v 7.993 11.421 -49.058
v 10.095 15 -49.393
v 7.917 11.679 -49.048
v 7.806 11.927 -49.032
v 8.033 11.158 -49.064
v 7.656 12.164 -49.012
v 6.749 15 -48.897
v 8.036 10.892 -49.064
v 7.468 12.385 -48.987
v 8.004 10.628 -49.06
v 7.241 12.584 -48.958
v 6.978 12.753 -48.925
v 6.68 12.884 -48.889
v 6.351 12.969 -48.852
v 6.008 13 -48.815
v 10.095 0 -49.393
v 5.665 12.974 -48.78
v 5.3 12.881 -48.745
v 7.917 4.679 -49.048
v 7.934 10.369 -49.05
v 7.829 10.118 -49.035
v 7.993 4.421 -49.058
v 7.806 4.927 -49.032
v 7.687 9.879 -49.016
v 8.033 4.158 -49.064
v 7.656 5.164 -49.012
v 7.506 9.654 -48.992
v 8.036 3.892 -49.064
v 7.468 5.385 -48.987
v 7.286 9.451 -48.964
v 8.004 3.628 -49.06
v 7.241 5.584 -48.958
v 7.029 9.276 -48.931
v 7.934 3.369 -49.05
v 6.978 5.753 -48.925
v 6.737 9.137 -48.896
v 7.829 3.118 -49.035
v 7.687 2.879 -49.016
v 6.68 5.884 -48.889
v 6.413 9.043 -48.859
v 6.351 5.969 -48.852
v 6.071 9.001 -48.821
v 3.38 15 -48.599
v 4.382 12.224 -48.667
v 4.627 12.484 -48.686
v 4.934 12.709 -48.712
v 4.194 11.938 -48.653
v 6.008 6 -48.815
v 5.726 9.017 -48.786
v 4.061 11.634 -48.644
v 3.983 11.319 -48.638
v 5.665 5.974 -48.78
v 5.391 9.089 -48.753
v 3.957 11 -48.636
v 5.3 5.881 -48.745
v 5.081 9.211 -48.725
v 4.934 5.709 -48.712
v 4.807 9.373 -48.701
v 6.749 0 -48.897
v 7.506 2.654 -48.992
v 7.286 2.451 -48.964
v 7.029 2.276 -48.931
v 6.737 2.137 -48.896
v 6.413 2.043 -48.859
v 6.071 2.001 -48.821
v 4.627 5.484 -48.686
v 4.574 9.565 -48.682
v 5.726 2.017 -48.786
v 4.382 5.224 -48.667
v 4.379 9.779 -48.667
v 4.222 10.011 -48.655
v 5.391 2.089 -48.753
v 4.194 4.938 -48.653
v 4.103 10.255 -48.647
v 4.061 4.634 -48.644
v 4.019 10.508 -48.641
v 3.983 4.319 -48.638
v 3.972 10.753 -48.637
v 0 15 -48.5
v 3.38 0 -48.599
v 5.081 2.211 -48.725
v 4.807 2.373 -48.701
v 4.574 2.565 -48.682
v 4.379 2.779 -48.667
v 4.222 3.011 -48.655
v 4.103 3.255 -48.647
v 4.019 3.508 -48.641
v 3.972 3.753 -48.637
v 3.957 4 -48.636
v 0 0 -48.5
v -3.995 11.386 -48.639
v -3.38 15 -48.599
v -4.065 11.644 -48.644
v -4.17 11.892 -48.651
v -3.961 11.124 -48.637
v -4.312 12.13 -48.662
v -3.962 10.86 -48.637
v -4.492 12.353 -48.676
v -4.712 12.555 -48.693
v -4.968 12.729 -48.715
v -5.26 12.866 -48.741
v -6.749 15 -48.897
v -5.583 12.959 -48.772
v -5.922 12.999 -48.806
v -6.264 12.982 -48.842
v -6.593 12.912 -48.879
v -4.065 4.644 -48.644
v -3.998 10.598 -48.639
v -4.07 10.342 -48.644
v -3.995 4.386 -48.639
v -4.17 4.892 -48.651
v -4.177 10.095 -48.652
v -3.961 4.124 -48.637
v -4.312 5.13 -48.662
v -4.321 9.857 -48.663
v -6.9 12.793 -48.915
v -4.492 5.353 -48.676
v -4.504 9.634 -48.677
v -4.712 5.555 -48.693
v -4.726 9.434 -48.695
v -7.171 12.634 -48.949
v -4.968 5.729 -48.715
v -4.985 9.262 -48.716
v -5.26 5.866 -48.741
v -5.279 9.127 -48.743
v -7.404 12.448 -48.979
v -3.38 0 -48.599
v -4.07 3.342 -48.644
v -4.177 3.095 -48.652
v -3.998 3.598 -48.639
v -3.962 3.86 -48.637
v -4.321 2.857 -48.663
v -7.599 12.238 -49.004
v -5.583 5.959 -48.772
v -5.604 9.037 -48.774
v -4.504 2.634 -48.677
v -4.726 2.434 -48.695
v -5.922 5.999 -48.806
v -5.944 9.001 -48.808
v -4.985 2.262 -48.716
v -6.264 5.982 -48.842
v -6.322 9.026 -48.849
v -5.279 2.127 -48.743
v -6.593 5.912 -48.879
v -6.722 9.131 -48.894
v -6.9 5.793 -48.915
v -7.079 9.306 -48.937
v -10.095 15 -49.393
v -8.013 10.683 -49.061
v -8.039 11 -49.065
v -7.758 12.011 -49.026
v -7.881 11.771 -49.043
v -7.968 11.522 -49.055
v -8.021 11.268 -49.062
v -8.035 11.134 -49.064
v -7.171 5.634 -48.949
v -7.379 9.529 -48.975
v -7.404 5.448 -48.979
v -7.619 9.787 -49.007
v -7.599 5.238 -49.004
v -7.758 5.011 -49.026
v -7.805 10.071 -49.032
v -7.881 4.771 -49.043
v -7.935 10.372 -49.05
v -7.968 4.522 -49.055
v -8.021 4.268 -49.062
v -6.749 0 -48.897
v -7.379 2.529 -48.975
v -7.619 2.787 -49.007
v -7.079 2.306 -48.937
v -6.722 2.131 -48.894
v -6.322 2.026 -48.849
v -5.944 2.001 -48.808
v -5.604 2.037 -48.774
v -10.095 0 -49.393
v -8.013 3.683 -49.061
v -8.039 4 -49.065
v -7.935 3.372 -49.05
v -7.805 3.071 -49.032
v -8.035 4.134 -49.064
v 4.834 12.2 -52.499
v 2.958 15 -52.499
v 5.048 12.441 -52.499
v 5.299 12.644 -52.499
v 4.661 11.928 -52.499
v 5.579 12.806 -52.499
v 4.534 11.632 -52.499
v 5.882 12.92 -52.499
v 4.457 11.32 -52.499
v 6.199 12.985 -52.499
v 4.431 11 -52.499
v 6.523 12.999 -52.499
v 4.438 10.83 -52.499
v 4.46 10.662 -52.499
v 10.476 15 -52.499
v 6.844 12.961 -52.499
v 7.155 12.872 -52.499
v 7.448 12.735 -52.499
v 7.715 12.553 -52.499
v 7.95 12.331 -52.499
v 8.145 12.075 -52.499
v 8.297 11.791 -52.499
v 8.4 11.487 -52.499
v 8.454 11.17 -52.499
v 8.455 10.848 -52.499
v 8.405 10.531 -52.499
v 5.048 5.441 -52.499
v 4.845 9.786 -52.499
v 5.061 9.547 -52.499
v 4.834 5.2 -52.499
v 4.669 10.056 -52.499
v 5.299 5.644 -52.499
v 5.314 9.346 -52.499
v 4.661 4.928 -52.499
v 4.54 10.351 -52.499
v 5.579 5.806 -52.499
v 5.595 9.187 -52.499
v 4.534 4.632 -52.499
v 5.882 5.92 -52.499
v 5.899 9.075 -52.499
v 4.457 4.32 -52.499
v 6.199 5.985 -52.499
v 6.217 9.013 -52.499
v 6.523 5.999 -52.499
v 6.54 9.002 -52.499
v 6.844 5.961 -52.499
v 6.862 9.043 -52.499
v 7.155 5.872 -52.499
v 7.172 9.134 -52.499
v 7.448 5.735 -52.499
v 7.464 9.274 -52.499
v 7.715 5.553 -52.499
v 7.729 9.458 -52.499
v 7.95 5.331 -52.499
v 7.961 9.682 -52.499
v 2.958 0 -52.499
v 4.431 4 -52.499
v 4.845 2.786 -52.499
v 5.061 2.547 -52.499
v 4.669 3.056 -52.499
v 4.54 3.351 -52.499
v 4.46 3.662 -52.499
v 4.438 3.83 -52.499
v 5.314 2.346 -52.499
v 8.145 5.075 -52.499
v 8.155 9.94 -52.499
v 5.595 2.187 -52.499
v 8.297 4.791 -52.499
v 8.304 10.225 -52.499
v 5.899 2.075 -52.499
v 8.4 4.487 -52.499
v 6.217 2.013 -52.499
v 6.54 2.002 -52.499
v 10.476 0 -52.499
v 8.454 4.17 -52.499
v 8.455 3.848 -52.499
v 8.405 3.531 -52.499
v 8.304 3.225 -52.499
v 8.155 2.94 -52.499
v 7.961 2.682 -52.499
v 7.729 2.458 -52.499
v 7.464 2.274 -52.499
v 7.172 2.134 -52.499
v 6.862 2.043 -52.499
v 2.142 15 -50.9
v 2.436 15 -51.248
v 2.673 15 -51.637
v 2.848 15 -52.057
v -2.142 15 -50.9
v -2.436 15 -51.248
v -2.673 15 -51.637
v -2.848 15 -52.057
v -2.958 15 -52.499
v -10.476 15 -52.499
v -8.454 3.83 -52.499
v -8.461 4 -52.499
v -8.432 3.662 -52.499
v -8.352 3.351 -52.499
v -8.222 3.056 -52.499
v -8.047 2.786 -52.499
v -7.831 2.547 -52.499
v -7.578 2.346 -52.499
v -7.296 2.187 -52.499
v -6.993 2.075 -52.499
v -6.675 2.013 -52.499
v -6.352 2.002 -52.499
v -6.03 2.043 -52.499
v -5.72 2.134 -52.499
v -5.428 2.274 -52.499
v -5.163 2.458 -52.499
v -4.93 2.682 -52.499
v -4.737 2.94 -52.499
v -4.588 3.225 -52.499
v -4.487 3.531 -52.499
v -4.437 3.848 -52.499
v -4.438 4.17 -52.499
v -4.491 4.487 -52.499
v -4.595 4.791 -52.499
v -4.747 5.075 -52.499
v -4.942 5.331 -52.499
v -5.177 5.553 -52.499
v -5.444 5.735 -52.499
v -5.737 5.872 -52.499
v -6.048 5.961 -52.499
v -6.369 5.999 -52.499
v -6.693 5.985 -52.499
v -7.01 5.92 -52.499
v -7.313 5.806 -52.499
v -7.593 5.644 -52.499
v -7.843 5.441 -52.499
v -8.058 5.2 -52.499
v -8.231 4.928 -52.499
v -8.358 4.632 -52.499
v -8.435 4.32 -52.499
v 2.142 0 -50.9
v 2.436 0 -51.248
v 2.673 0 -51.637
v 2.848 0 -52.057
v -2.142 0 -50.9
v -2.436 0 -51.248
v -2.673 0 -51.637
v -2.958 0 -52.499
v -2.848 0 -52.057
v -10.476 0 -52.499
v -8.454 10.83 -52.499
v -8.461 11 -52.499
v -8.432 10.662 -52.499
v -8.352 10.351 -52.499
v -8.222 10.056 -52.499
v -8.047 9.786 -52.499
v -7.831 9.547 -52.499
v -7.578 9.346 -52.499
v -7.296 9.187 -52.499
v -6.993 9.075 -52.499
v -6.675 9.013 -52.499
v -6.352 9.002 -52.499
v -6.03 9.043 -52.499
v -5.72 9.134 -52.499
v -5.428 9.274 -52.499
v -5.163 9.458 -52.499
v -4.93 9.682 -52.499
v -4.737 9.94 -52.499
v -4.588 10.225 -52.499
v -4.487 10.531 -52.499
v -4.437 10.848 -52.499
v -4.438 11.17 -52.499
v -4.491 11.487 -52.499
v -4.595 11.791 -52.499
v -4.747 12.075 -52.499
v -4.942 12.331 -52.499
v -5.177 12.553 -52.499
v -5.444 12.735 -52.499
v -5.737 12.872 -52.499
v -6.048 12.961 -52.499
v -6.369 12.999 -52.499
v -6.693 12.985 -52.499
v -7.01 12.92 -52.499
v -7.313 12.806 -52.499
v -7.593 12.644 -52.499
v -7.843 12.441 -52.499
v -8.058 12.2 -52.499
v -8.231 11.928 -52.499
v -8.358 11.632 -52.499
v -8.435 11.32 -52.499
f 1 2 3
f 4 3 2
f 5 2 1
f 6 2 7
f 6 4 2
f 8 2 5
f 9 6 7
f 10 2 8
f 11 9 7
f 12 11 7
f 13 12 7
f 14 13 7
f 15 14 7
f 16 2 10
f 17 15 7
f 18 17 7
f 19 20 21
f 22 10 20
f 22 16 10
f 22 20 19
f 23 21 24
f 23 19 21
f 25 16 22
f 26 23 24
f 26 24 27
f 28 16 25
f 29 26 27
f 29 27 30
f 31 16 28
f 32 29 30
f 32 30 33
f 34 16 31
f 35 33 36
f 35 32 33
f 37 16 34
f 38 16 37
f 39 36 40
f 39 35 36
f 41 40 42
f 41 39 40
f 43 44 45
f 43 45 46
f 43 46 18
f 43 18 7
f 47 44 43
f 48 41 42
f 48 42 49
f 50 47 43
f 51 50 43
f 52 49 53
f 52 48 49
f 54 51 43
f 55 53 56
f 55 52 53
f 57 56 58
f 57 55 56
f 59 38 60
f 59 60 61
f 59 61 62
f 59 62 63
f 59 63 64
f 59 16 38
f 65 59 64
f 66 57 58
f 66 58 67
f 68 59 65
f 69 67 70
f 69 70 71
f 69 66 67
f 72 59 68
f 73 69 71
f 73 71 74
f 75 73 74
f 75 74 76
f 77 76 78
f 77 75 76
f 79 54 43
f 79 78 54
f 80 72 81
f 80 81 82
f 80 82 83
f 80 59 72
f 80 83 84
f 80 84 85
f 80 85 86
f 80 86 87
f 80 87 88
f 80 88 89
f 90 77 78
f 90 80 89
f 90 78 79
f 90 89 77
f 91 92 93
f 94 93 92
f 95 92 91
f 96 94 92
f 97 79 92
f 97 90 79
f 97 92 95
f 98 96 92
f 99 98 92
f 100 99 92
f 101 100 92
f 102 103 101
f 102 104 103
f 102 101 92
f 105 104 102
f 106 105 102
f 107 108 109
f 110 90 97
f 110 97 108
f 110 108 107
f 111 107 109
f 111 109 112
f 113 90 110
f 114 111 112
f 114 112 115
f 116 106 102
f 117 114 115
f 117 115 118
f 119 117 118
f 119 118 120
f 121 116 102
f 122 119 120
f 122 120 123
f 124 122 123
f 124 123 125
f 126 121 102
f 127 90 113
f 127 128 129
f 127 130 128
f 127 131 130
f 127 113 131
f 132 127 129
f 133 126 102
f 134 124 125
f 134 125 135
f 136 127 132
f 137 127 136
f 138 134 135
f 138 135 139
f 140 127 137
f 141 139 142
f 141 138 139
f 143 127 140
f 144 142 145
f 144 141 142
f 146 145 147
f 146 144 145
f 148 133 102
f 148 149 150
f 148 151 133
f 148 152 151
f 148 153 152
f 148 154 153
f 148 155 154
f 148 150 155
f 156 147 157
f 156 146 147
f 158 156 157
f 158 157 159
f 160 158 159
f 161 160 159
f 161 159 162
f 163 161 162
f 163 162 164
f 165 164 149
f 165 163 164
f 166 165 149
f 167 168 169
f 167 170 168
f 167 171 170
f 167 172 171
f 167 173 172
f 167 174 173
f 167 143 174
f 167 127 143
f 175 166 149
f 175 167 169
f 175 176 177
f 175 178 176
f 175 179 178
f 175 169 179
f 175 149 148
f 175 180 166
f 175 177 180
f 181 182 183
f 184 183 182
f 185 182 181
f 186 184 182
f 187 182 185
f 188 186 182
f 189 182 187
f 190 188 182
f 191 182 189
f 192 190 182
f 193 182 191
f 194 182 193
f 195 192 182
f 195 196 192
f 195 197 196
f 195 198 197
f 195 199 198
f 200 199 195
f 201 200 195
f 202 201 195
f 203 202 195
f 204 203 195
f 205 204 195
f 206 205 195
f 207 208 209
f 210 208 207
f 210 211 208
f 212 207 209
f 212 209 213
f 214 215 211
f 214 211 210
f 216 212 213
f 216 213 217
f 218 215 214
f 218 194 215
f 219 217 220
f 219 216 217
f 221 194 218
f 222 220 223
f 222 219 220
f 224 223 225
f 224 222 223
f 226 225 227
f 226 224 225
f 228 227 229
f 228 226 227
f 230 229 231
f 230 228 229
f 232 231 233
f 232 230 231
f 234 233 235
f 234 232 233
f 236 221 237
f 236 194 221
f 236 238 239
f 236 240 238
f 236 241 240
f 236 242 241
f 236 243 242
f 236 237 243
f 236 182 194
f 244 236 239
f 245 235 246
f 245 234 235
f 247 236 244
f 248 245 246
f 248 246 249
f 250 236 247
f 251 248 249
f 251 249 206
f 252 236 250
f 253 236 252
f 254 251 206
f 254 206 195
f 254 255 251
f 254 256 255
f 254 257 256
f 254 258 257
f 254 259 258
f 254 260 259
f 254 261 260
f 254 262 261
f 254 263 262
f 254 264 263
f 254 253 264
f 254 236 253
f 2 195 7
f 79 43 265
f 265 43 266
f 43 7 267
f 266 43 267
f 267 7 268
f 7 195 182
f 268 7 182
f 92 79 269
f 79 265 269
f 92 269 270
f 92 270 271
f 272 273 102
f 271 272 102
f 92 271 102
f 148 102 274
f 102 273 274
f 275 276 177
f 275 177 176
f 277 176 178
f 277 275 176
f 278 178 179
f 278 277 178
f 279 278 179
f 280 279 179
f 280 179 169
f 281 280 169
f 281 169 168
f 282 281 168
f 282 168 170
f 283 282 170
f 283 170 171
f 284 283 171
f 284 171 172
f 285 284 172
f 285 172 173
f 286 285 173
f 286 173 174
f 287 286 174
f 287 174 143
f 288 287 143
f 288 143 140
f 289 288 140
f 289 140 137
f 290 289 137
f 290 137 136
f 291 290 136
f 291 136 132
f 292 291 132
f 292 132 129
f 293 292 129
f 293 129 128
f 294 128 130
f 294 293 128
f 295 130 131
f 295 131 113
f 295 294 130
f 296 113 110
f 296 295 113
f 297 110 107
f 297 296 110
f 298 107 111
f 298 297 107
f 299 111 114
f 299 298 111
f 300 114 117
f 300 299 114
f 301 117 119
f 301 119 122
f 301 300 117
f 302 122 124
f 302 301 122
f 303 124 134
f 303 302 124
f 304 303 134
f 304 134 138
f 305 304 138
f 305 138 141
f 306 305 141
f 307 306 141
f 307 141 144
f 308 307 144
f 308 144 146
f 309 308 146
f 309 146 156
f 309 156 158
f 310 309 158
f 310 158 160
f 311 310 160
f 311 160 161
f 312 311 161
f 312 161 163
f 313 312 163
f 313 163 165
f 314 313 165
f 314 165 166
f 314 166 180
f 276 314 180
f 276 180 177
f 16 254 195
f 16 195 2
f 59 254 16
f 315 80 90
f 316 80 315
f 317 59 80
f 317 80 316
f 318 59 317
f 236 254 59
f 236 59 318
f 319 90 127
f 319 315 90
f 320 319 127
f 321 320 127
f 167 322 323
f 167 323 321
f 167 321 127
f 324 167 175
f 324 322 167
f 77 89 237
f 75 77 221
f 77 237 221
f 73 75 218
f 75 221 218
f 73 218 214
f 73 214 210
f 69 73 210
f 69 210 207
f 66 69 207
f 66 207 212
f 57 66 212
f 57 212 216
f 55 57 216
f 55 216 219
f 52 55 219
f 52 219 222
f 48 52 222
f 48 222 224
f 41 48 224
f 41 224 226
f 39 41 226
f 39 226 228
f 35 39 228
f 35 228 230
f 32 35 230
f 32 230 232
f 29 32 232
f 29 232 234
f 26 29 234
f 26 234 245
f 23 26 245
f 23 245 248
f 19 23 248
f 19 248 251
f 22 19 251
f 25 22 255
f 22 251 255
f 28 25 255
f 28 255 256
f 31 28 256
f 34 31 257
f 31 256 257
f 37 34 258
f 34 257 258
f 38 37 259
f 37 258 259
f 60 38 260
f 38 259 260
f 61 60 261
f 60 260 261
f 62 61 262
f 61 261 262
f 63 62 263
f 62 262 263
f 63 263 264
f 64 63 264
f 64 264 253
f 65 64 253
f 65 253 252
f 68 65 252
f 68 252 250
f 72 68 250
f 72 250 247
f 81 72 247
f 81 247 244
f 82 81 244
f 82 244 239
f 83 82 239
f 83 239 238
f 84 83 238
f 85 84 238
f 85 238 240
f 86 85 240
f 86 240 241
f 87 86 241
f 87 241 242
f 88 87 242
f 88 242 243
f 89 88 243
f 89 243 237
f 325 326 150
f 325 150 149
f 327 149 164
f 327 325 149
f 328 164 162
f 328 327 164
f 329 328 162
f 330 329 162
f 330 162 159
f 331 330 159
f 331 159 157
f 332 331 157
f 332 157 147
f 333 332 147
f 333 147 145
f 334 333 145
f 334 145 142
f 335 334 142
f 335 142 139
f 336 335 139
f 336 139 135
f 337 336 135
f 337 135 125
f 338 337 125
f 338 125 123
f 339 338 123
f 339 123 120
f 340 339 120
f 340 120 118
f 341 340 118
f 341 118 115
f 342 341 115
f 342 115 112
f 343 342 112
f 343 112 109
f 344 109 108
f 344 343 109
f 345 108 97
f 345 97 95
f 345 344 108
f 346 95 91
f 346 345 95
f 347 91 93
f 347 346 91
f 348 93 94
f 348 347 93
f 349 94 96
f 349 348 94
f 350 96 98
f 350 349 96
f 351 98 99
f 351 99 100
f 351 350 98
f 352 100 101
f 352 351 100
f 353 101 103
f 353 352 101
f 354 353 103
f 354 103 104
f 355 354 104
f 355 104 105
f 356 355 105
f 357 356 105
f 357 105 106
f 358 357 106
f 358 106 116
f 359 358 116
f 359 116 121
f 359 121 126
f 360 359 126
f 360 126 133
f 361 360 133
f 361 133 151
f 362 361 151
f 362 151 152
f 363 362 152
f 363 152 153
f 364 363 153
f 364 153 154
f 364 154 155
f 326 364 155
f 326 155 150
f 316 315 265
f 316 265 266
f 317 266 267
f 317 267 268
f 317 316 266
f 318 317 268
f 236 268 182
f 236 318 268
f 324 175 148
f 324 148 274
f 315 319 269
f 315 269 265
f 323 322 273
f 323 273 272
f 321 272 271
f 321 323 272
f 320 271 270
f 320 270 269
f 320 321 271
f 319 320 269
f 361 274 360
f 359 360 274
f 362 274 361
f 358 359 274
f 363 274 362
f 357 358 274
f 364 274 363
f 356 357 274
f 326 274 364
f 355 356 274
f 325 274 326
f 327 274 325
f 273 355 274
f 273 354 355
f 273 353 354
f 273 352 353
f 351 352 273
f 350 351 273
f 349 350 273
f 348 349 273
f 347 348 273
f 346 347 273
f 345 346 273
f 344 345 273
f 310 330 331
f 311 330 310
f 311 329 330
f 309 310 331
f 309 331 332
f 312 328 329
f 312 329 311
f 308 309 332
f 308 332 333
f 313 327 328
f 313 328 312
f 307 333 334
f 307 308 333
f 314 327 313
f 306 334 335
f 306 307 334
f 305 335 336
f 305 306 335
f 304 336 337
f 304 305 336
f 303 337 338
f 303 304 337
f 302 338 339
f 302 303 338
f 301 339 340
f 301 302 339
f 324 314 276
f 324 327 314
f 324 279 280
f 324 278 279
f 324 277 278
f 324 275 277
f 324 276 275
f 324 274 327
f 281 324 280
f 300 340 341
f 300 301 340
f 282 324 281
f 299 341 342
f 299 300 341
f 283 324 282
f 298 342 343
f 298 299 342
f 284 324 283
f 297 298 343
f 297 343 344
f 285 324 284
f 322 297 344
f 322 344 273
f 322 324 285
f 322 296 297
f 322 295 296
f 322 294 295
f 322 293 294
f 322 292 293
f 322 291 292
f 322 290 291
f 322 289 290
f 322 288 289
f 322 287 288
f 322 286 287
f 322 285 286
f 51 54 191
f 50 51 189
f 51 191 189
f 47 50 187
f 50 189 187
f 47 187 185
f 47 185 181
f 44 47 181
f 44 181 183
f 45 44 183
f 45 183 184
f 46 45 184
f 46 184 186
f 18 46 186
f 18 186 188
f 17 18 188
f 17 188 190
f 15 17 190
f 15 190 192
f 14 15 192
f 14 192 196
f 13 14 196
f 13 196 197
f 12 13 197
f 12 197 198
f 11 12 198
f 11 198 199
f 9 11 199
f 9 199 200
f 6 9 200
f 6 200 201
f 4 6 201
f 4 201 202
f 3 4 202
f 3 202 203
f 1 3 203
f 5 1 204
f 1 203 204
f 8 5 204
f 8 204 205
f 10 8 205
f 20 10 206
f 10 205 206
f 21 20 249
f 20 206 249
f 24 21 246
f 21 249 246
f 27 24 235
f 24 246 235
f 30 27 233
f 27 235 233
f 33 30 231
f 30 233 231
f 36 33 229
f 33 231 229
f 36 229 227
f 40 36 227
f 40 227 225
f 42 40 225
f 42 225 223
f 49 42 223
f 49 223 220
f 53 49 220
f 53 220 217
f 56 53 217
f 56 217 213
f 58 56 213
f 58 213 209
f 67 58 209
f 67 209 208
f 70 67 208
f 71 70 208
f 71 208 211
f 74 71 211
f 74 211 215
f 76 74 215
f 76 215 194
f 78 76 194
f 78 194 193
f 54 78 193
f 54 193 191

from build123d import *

# Parameters (mm, degrees)
EXTRUDE_1_DEPTH     = 15
SKETCH_2_R          = 2
CUT_EXTRUDE_1_DEPTH = 62
SKETCH_4_R          = 2
CUT_EXTRUDE_2_DEPTH = 62


with BuildPart() as part:
    # 草图1 → 凸台-拉伸1 (new body)
    with BuildSketch(Plane(origin=(0, 0, 0), x_dir=(1, 0, 0), z_dir=(0, 1, 0))):
        with BuildLine():
            Line((-2.142428529, 50.9), (2.142428529, 50.9))
            ThreePointArc((2.142428529, 50.9), (2.672598452, 51.637202321), (2.957914583, 52.49925923))
            Line((2.957914583, 52.49925923), (10.476137794, 52.49925923))
            Line((10.476137794, 52.49925923), (10.094743956, 49.393055687))
            ThreePointArc((10.094743956, 49.393055687), (0, 48.5), (-10.094743956, 49.393055687))
            Line((-10.094743956, 49.393055687), (-10.476137794, 52.49925923))
            Line((-10.476137794, 52.49925923), (-2.957914583, 52.49925923))
            ThreePointArc((-2.957914583, 52.49925923), (-2.672598452, 51.637202321), (-2.142428529, 50.9))
        make_face()
    extrude(amount=EXTRUDE_1_DEPTH)

    # 草图2 → 切除-拉伸1 (cut)
    with BuildSketch(Plane(origin=(-12.821860467, 0, -104.425673493), x_dir=(0.9925461516413212, 0, -0.12186934340515458), z_dir=(0.12186934340515458, 0, 0.9925461516413212))):
        with Locations(Location((0.000150401, 4, 0), (0, 0, 180))):
            Circle(SKETCH_2_R)
        with Locations(Location((0.000150401, 11, 0), (0, 0, 180))):
            Circle(SKETCH_2_R)
    extrude(amount=CUT_EXTRUDE_1_DEPTH, mode=Mode.SUBTRACT)

    # 草图4 → 切除-拉伸2 (cut)
    with BuildSketch(Plane(origin=(12.821860467, 0, -104.425673493), x_dir=(-0.992546151641322, 0, -0.12186934340514766), z_dir=(0.12186934340514766, 0, -0.992546151641322))):
        with Locations((0.000150401, 11)):
            Circle(SKETCH_4_R)
        with Locations((0.000150401, 4)):
            Circle(SKETCH_4_R)
    extrude(amount=-CUT_EXTRUDE_2_DEPTH, mode=Mode.SUBTRACT)


solid = part.part
